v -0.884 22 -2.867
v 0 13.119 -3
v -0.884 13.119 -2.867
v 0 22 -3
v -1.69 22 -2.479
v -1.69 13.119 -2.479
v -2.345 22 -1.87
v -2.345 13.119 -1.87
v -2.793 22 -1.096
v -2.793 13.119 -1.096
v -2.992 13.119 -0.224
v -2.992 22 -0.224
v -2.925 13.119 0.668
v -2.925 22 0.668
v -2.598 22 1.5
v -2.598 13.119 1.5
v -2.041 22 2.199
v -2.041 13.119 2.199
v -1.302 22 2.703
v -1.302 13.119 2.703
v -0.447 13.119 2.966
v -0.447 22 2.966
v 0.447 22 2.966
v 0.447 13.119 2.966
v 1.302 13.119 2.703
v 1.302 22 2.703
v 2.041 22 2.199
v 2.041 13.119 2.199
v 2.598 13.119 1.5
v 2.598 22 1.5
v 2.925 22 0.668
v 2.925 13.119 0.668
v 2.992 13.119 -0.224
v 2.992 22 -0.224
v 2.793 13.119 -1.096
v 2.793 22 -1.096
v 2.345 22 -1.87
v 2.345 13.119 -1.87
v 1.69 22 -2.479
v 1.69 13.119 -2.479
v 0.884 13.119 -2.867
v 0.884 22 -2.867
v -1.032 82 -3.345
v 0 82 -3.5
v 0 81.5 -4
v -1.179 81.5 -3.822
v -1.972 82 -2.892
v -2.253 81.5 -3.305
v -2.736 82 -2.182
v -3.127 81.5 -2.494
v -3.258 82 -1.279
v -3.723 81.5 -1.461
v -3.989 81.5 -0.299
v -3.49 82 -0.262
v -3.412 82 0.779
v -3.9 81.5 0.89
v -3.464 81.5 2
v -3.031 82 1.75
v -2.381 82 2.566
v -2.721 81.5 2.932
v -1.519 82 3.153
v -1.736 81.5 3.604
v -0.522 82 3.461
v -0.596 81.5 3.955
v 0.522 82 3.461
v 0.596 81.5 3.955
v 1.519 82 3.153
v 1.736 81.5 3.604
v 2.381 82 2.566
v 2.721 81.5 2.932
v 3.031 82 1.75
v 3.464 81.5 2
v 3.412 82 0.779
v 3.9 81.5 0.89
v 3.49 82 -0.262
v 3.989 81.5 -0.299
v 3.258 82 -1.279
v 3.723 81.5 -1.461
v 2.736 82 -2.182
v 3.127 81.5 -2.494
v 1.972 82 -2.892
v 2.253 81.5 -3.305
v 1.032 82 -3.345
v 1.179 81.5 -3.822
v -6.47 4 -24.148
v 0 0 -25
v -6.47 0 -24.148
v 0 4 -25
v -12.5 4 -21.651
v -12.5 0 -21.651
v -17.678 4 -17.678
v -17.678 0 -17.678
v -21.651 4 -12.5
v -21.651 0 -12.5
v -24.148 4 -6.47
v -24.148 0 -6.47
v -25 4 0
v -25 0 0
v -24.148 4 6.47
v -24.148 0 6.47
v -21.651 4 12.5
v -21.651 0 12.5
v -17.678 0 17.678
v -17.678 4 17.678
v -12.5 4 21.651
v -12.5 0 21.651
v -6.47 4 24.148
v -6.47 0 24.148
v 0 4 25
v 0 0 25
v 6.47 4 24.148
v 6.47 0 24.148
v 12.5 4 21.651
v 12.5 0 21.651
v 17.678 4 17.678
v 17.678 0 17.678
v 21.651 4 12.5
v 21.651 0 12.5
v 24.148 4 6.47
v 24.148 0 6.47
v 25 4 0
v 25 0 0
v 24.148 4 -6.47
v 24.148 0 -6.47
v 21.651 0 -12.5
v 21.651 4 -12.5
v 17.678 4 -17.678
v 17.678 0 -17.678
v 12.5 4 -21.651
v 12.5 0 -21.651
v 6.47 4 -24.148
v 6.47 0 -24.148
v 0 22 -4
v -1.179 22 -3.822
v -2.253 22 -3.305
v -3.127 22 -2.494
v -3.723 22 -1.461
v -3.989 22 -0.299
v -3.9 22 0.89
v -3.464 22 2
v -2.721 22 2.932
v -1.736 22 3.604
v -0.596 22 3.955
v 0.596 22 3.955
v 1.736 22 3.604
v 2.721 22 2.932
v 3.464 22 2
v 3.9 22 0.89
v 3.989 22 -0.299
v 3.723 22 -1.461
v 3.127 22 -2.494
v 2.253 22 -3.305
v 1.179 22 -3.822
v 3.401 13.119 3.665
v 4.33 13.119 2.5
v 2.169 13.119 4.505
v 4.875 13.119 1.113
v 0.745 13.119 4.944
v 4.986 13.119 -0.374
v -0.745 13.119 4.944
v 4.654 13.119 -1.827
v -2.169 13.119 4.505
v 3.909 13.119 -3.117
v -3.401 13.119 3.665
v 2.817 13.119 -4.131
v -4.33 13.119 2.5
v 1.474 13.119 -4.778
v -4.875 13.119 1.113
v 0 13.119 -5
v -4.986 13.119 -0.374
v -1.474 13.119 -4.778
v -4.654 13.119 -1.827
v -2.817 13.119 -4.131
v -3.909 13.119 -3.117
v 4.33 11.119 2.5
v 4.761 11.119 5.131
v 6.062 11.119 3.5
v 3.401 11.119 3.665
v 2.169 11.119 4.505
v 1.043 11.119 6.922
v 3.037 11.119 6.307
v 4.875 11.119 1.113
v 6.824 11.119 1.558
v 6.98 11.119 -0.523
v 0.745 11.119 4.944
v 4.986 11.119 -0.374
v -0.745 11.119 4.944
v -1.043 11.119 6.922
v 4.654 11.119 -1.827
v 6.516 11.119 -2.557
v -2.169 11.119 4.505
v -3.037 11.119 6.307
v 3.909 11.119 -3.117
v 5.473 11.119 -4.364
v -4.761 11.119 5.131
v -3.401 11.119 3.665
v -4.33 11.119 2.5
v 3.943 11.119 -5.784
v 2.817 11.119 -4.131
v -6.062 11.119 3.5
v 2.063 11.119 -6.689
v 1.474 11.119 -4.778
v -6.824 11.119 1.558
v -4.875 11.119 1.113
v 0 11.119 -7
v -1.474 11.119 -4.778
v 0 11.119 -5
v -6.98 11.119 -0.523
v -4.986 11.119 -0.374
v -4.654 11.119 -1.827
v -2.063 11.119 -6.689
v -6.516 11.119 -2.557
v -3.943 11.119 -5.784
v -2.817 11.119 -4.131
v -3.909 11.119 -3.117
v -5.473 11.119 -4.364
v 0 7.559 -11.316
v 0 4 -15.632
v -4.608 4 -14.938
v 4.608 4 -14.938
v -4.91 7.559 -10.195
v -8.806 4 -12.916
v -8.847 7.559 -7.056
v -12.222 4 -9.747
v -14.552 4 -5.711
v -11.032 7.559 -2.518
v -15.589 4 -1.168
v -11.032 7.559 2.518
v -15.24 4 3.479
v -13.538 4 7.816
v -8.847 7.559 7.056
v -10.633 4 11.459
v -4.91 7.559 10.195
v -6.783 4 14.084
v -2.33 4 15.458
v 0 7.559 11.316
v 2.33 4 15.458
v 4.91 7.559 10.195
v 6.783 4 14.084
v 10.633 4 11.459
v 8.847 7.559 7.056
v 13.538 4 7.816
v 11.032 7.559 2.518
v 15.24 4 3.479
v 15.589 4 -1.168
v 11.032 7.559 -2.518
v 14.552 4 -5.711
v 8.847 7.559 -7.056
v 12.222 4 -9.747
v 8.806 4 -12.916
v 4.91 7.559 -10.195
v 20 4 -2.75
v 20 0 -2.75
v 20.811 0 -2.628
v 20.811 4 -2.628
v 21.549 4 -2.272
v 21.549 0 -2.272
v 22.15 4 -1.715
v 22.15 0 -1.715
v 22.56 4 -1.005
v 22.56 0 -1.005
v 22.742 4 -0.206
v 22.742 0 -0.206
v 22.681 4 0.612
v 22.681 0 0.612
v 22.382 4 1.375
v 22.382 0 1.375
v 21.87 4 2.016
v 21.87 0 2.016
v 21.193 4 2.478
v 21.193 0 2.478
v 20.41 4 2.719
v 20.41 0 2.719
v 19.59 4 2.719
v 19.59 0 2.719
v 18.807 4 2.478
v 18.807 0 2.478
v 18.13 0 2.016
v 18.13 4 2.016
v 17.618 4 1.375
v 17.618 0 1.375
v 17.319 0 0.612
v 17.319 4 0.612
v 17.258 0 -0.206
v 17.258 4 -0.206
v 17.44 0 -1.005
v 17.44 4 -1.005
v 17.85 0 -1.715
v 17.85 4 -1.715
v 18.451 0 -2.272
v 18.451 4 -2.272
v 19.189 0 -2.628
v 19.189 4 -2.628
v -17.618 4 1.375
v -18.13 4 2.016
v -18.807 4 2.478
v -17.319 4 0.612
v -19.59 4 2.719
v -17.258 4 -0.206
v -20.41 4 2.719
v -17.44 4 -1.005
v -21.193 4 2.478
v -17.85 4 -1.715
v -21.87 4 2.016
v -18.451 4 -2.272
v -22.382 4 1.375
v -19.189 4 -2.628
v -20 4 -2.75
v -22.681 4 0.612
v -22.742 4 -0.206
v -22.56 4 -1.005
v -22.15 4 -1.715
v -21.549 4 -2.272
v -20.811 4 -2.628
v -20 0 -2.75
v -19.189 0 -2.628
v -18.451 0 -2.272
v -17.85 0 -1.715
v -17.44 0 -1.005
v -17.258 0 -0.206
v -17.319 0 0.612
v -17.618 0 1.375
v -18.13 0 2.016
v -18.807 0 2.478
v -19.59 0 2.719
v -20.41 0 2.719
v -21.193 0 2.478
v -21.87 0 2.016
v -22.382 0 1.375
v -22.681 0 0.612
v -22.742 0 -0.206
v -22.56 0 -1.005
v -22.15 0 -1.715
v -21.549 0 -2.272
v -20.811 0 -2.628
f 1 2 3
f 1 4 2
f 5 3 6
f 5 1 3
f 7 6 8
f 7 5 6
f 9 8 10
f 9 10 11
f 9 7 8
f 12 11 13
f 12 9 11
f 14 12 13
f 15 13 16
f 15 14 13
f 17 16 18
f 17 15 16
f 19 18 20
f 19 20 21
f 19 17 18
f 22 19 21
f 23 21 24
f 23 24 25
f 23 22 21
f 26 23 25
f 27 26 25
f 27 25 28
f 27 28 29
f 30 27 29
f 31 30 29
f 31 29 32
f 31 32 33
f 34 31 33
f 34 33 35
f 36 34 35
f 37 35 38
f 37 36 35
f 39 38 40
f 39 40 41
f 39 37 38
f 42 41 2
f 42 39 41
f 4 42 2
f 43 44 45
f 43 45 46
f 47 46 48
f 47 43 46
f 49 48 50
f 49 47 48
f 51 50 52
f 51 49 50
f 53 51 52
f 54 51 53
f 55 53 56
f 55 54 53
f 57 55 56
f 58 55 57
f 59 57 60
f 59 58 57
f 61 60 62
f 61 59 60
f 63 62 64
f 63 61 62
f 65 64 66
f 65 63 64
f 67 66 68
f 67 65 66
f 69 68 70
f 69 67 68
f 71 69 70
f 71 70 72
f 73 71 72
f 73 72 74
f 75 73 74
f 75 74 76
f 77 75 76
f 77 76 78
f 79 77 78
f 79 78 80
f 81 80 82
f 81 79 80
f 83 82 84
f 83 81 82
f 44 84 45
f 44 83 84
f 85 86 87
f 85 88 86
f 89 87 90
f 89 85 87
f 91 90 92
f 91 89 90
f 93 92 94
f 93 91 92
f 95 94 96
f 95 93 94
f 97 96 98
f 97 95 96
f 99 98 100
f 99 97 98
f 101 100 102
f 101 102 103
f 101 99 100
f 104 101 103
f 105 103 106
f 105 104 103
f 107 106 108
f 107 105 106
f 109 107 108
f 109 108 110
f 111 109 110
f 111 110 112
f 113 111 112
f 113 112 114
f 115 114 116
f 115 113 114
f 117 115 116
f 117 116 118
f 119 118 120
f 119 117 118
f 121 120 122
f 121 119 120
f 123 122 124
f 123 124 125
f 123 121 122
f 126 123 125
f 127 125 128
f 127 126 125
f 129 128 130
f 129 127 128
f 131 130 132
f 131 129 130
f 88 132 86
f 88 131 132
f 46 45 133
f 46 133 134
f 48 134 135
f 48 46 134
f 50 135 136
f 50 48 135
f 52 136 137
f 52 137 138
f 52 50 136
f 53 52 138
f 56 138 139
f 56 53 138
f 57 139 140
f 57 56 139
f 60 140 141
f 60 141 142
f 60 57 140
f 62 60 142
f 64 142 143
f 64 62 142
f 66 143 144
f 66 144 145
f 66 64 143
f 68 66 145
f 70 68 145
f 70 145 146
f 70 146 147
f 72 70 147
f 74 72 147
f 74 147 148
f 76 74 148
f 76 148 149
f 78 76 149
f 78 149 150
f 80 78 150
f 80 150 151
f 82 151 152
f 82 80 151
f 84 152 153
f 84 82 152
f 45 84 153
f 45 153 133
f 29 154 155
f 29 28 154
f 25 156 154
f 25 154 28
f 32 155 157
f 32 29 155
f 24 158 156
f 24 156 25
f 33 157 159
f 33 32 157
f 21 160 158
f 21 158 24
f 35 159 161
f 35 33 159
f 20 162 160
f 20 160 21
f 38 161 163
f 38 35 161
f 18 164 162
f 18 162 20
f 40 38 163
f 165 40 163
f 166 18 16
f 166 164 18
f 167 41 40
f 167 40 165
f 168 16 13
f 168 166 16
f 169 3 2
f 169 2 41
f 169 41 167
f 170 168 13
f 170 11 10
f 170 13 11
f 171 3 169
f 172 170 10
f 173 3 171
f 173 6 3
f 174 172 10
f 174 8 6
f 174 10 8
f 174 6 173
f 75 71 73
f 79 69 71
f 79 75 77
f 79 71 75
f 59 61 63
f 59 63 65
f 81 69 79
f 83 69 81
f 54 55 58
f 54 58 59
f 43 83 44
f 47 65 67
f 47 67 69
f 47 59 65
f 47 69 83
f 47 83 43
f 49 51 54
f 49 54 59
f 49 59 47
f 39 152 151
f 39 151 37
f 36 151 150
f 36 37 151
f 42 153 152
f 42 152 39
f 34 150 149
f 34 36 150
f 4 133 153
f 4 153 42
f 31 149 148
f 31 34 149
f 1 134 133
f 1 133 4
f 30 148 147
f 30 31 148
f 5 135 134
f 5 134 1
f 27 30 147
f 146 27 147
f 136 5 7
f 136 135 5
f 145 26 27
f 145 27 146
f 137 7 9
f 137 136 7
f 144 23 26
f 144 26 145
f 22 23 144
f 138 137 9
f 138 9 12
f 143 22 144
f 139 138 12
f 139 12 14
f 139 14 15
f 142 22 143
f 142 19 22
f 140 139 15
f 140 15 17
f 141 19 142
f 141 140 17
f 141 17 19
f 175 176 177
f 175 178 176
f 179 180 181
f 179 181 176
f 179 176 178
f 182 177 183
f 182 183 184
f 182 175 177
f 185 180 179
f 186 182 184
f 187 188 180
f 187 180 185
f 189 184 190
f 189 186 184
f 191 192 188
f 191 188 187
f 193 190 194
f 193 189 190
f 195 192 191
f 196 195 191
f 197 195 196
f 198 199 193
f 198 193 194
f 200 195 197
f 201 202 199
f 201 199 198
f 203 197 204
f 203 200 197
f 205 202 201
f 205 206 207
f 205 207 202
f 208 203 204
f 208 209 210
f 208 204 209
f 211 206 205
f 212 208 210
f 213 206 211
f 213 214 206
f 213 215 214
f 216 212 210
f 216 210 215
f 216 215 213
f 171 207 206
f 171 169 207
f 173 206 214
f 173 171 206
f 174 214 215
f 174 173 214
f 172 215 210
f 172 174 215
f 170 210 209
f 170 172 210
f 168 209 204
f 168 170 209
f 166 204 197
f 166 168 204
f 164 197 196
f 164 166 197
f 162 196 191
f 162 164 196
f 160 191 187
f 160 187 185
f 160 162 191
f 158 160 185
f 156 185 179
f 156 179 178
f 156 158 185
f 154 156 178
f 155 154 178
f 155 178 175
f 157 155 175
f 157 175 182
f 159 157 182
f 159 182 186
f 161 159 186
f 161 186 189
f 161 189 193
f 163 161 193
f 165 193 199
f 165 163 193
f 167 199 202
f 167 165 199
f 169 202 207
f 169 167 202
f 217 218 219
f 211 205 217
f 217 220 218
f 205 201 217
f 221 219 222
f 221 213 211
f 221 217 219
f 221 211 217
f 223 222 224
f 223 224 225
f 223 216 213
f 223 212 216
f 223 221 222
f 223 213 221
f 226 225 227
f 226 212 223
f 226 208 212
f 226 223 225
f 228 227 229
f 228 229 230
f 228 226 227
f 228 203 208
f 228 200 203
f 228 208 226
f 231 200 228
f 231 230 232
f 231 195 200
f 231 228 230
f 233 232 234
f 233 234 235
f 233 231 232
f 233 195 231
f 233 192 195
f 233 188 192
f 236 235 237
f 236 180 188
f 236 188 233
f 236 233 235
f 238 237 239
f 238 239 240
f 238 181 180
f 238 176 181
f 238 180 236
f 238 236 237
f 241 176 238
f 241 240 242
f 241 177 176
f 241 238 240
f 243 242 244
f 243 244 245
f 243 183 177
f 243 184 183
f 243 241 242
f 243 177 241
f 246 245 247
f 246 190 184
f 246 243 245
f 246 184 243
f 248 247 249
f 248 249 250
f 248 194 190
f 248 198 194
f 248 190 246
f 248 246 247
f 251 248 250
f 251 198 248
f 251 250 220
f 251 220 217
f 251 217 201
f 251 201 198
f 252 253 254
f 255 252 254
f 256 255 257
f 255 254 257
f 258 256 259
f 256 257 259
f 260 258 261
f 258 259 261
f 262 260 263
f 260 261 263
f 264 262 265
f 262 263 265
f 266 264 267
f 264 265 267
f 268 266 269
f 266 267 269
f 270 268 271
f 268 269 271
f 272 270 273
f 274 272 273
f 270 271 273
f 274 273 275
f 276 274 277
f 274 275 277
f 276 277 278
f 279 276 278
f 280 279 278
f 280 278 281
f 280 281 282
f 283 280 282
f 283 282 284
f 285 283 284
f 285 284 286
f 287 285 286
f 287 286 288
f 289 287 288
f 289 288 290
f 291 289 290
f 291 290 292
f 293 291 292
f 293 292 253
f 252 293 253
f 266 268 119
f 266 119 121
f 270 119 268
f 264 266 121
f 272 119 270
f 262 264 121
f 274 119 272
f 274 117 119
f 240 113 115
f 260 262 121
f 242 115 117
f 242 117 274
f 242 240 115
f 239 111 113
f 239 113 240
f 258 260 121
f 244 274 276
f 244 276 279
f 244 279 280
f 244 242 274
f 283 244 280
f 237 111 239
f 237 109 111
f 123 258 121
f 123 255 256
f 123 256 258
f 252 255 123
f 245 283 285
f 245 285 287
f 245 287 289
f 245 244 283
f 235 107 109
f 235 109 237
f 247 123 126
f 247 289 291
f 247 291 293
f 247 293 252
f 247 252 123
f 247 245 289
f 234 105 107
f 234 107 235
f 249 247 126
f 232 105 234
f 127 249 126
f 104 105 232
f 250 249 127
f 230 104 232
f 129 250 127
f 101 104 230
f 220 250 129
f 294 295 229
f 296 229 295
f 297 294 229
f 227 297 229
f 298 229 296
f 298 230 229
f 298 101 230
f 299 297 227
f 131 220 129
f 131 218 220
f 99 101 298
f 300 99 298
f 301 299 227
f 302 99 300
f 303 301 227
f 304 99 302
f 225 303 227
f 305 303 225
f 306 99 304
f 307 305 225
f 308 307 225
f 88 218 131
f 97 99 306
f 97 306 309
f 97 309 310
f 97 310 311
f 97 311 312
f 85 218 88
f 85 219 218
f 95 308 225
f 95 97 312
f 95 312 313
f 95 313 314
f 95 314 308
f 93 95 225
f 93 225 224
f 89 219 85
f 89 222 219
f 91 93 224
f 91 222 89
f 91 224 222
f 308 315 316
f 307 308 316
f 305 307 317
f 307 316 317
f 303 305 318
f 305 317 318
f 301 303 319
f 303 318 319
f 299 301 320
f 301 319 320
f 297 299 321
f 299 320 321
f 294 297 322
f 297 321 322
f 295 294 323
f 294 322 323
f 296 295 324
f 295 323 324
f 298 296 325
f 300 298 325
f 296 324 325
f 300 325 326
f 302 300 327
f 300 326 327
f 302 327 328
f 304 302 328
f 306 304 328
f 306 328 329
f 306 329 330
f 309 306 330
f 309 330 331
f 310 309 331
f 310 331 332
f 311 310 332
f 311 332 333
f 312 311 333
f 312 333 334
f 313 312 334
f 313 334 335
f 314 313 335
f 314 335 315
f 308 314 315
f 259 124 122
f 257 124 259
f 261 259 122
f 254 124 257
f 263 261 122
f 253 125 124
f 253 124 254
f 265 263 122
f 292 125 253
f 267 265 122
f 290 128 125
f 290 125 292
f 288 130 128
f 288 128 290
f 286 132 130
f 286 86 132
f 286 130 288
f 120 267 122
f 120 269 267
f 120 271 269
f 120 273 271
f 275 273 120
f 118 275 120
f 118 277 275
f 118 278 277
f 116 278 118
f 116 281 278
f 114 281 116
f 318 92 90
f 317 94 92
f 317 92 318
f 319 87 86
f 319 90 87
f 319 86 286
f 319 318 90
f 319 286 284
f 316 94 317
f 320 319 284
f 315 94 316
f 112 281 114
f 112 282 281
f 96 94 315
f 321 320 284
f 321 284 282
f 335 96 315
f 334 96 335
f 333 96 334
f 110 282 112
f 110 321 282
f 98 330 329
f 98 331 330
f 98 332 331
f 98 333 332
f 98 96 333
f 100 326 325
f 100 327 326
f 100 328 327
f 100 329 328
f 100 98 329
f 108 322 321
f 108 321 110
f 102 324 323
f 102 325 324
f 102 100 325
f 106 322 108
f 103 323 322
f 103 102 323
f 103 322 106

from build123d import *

# Parameters (mm, degrees)
CHANFREIN1_SIZE         = 0.5
ESQUISSE2_R             = 2.75
ENL_V_MAT_EXTRU_1_DEPTH = 90.297256397


with BuildPart() as part:
    # Esquisse1 → Révolution1 (revolve)
    with BuildSketch(Plane.XY, mode=Mode.PRIVATE) as r_volution1_sk:
        Polygon((0, 0), (25, 0), (25, 4), (15.632287961, 4), (7, 11.118702223), (5, 11.118702223), (5, 13.118702223), (3, 13.118702223), (3, 22), (4, 22), (4, 82), (0, 82), align=None)
    revolve(r_volution1_sk.sketch.rotate(Axis((0, 0, 0), (0, 1, 0)), 90), axis=Axis((0, 0, 0), (0, 1, 0)))

    # Chanfrein1
    chanfrein1_edges = [part.edges().sort_by_distance(p)[0] for p in [
        (0, 82, 4),
    ]]
    chamfer(chanfrein1_edges, length=CHANFREIN1_SIZE)

    # Esquisse2 → Enlèv. mat.-Extru.1 (cut, through all)
    with BuildSketch(Plane.XZ):
        with Locations(Location((-20, 0, 0), (0, 0, 270))):
            Circle(ESQUISSE2_R)
        with Locations(Location((20, 0, 0), (0, 0, 270))):
            Circle(ESQUISSE2_R)
    extrude(amount=-ENL_V_MAT_EXTRU_1_DEPTH, mode=Mode.SUBTRACT)


solid = part.part
